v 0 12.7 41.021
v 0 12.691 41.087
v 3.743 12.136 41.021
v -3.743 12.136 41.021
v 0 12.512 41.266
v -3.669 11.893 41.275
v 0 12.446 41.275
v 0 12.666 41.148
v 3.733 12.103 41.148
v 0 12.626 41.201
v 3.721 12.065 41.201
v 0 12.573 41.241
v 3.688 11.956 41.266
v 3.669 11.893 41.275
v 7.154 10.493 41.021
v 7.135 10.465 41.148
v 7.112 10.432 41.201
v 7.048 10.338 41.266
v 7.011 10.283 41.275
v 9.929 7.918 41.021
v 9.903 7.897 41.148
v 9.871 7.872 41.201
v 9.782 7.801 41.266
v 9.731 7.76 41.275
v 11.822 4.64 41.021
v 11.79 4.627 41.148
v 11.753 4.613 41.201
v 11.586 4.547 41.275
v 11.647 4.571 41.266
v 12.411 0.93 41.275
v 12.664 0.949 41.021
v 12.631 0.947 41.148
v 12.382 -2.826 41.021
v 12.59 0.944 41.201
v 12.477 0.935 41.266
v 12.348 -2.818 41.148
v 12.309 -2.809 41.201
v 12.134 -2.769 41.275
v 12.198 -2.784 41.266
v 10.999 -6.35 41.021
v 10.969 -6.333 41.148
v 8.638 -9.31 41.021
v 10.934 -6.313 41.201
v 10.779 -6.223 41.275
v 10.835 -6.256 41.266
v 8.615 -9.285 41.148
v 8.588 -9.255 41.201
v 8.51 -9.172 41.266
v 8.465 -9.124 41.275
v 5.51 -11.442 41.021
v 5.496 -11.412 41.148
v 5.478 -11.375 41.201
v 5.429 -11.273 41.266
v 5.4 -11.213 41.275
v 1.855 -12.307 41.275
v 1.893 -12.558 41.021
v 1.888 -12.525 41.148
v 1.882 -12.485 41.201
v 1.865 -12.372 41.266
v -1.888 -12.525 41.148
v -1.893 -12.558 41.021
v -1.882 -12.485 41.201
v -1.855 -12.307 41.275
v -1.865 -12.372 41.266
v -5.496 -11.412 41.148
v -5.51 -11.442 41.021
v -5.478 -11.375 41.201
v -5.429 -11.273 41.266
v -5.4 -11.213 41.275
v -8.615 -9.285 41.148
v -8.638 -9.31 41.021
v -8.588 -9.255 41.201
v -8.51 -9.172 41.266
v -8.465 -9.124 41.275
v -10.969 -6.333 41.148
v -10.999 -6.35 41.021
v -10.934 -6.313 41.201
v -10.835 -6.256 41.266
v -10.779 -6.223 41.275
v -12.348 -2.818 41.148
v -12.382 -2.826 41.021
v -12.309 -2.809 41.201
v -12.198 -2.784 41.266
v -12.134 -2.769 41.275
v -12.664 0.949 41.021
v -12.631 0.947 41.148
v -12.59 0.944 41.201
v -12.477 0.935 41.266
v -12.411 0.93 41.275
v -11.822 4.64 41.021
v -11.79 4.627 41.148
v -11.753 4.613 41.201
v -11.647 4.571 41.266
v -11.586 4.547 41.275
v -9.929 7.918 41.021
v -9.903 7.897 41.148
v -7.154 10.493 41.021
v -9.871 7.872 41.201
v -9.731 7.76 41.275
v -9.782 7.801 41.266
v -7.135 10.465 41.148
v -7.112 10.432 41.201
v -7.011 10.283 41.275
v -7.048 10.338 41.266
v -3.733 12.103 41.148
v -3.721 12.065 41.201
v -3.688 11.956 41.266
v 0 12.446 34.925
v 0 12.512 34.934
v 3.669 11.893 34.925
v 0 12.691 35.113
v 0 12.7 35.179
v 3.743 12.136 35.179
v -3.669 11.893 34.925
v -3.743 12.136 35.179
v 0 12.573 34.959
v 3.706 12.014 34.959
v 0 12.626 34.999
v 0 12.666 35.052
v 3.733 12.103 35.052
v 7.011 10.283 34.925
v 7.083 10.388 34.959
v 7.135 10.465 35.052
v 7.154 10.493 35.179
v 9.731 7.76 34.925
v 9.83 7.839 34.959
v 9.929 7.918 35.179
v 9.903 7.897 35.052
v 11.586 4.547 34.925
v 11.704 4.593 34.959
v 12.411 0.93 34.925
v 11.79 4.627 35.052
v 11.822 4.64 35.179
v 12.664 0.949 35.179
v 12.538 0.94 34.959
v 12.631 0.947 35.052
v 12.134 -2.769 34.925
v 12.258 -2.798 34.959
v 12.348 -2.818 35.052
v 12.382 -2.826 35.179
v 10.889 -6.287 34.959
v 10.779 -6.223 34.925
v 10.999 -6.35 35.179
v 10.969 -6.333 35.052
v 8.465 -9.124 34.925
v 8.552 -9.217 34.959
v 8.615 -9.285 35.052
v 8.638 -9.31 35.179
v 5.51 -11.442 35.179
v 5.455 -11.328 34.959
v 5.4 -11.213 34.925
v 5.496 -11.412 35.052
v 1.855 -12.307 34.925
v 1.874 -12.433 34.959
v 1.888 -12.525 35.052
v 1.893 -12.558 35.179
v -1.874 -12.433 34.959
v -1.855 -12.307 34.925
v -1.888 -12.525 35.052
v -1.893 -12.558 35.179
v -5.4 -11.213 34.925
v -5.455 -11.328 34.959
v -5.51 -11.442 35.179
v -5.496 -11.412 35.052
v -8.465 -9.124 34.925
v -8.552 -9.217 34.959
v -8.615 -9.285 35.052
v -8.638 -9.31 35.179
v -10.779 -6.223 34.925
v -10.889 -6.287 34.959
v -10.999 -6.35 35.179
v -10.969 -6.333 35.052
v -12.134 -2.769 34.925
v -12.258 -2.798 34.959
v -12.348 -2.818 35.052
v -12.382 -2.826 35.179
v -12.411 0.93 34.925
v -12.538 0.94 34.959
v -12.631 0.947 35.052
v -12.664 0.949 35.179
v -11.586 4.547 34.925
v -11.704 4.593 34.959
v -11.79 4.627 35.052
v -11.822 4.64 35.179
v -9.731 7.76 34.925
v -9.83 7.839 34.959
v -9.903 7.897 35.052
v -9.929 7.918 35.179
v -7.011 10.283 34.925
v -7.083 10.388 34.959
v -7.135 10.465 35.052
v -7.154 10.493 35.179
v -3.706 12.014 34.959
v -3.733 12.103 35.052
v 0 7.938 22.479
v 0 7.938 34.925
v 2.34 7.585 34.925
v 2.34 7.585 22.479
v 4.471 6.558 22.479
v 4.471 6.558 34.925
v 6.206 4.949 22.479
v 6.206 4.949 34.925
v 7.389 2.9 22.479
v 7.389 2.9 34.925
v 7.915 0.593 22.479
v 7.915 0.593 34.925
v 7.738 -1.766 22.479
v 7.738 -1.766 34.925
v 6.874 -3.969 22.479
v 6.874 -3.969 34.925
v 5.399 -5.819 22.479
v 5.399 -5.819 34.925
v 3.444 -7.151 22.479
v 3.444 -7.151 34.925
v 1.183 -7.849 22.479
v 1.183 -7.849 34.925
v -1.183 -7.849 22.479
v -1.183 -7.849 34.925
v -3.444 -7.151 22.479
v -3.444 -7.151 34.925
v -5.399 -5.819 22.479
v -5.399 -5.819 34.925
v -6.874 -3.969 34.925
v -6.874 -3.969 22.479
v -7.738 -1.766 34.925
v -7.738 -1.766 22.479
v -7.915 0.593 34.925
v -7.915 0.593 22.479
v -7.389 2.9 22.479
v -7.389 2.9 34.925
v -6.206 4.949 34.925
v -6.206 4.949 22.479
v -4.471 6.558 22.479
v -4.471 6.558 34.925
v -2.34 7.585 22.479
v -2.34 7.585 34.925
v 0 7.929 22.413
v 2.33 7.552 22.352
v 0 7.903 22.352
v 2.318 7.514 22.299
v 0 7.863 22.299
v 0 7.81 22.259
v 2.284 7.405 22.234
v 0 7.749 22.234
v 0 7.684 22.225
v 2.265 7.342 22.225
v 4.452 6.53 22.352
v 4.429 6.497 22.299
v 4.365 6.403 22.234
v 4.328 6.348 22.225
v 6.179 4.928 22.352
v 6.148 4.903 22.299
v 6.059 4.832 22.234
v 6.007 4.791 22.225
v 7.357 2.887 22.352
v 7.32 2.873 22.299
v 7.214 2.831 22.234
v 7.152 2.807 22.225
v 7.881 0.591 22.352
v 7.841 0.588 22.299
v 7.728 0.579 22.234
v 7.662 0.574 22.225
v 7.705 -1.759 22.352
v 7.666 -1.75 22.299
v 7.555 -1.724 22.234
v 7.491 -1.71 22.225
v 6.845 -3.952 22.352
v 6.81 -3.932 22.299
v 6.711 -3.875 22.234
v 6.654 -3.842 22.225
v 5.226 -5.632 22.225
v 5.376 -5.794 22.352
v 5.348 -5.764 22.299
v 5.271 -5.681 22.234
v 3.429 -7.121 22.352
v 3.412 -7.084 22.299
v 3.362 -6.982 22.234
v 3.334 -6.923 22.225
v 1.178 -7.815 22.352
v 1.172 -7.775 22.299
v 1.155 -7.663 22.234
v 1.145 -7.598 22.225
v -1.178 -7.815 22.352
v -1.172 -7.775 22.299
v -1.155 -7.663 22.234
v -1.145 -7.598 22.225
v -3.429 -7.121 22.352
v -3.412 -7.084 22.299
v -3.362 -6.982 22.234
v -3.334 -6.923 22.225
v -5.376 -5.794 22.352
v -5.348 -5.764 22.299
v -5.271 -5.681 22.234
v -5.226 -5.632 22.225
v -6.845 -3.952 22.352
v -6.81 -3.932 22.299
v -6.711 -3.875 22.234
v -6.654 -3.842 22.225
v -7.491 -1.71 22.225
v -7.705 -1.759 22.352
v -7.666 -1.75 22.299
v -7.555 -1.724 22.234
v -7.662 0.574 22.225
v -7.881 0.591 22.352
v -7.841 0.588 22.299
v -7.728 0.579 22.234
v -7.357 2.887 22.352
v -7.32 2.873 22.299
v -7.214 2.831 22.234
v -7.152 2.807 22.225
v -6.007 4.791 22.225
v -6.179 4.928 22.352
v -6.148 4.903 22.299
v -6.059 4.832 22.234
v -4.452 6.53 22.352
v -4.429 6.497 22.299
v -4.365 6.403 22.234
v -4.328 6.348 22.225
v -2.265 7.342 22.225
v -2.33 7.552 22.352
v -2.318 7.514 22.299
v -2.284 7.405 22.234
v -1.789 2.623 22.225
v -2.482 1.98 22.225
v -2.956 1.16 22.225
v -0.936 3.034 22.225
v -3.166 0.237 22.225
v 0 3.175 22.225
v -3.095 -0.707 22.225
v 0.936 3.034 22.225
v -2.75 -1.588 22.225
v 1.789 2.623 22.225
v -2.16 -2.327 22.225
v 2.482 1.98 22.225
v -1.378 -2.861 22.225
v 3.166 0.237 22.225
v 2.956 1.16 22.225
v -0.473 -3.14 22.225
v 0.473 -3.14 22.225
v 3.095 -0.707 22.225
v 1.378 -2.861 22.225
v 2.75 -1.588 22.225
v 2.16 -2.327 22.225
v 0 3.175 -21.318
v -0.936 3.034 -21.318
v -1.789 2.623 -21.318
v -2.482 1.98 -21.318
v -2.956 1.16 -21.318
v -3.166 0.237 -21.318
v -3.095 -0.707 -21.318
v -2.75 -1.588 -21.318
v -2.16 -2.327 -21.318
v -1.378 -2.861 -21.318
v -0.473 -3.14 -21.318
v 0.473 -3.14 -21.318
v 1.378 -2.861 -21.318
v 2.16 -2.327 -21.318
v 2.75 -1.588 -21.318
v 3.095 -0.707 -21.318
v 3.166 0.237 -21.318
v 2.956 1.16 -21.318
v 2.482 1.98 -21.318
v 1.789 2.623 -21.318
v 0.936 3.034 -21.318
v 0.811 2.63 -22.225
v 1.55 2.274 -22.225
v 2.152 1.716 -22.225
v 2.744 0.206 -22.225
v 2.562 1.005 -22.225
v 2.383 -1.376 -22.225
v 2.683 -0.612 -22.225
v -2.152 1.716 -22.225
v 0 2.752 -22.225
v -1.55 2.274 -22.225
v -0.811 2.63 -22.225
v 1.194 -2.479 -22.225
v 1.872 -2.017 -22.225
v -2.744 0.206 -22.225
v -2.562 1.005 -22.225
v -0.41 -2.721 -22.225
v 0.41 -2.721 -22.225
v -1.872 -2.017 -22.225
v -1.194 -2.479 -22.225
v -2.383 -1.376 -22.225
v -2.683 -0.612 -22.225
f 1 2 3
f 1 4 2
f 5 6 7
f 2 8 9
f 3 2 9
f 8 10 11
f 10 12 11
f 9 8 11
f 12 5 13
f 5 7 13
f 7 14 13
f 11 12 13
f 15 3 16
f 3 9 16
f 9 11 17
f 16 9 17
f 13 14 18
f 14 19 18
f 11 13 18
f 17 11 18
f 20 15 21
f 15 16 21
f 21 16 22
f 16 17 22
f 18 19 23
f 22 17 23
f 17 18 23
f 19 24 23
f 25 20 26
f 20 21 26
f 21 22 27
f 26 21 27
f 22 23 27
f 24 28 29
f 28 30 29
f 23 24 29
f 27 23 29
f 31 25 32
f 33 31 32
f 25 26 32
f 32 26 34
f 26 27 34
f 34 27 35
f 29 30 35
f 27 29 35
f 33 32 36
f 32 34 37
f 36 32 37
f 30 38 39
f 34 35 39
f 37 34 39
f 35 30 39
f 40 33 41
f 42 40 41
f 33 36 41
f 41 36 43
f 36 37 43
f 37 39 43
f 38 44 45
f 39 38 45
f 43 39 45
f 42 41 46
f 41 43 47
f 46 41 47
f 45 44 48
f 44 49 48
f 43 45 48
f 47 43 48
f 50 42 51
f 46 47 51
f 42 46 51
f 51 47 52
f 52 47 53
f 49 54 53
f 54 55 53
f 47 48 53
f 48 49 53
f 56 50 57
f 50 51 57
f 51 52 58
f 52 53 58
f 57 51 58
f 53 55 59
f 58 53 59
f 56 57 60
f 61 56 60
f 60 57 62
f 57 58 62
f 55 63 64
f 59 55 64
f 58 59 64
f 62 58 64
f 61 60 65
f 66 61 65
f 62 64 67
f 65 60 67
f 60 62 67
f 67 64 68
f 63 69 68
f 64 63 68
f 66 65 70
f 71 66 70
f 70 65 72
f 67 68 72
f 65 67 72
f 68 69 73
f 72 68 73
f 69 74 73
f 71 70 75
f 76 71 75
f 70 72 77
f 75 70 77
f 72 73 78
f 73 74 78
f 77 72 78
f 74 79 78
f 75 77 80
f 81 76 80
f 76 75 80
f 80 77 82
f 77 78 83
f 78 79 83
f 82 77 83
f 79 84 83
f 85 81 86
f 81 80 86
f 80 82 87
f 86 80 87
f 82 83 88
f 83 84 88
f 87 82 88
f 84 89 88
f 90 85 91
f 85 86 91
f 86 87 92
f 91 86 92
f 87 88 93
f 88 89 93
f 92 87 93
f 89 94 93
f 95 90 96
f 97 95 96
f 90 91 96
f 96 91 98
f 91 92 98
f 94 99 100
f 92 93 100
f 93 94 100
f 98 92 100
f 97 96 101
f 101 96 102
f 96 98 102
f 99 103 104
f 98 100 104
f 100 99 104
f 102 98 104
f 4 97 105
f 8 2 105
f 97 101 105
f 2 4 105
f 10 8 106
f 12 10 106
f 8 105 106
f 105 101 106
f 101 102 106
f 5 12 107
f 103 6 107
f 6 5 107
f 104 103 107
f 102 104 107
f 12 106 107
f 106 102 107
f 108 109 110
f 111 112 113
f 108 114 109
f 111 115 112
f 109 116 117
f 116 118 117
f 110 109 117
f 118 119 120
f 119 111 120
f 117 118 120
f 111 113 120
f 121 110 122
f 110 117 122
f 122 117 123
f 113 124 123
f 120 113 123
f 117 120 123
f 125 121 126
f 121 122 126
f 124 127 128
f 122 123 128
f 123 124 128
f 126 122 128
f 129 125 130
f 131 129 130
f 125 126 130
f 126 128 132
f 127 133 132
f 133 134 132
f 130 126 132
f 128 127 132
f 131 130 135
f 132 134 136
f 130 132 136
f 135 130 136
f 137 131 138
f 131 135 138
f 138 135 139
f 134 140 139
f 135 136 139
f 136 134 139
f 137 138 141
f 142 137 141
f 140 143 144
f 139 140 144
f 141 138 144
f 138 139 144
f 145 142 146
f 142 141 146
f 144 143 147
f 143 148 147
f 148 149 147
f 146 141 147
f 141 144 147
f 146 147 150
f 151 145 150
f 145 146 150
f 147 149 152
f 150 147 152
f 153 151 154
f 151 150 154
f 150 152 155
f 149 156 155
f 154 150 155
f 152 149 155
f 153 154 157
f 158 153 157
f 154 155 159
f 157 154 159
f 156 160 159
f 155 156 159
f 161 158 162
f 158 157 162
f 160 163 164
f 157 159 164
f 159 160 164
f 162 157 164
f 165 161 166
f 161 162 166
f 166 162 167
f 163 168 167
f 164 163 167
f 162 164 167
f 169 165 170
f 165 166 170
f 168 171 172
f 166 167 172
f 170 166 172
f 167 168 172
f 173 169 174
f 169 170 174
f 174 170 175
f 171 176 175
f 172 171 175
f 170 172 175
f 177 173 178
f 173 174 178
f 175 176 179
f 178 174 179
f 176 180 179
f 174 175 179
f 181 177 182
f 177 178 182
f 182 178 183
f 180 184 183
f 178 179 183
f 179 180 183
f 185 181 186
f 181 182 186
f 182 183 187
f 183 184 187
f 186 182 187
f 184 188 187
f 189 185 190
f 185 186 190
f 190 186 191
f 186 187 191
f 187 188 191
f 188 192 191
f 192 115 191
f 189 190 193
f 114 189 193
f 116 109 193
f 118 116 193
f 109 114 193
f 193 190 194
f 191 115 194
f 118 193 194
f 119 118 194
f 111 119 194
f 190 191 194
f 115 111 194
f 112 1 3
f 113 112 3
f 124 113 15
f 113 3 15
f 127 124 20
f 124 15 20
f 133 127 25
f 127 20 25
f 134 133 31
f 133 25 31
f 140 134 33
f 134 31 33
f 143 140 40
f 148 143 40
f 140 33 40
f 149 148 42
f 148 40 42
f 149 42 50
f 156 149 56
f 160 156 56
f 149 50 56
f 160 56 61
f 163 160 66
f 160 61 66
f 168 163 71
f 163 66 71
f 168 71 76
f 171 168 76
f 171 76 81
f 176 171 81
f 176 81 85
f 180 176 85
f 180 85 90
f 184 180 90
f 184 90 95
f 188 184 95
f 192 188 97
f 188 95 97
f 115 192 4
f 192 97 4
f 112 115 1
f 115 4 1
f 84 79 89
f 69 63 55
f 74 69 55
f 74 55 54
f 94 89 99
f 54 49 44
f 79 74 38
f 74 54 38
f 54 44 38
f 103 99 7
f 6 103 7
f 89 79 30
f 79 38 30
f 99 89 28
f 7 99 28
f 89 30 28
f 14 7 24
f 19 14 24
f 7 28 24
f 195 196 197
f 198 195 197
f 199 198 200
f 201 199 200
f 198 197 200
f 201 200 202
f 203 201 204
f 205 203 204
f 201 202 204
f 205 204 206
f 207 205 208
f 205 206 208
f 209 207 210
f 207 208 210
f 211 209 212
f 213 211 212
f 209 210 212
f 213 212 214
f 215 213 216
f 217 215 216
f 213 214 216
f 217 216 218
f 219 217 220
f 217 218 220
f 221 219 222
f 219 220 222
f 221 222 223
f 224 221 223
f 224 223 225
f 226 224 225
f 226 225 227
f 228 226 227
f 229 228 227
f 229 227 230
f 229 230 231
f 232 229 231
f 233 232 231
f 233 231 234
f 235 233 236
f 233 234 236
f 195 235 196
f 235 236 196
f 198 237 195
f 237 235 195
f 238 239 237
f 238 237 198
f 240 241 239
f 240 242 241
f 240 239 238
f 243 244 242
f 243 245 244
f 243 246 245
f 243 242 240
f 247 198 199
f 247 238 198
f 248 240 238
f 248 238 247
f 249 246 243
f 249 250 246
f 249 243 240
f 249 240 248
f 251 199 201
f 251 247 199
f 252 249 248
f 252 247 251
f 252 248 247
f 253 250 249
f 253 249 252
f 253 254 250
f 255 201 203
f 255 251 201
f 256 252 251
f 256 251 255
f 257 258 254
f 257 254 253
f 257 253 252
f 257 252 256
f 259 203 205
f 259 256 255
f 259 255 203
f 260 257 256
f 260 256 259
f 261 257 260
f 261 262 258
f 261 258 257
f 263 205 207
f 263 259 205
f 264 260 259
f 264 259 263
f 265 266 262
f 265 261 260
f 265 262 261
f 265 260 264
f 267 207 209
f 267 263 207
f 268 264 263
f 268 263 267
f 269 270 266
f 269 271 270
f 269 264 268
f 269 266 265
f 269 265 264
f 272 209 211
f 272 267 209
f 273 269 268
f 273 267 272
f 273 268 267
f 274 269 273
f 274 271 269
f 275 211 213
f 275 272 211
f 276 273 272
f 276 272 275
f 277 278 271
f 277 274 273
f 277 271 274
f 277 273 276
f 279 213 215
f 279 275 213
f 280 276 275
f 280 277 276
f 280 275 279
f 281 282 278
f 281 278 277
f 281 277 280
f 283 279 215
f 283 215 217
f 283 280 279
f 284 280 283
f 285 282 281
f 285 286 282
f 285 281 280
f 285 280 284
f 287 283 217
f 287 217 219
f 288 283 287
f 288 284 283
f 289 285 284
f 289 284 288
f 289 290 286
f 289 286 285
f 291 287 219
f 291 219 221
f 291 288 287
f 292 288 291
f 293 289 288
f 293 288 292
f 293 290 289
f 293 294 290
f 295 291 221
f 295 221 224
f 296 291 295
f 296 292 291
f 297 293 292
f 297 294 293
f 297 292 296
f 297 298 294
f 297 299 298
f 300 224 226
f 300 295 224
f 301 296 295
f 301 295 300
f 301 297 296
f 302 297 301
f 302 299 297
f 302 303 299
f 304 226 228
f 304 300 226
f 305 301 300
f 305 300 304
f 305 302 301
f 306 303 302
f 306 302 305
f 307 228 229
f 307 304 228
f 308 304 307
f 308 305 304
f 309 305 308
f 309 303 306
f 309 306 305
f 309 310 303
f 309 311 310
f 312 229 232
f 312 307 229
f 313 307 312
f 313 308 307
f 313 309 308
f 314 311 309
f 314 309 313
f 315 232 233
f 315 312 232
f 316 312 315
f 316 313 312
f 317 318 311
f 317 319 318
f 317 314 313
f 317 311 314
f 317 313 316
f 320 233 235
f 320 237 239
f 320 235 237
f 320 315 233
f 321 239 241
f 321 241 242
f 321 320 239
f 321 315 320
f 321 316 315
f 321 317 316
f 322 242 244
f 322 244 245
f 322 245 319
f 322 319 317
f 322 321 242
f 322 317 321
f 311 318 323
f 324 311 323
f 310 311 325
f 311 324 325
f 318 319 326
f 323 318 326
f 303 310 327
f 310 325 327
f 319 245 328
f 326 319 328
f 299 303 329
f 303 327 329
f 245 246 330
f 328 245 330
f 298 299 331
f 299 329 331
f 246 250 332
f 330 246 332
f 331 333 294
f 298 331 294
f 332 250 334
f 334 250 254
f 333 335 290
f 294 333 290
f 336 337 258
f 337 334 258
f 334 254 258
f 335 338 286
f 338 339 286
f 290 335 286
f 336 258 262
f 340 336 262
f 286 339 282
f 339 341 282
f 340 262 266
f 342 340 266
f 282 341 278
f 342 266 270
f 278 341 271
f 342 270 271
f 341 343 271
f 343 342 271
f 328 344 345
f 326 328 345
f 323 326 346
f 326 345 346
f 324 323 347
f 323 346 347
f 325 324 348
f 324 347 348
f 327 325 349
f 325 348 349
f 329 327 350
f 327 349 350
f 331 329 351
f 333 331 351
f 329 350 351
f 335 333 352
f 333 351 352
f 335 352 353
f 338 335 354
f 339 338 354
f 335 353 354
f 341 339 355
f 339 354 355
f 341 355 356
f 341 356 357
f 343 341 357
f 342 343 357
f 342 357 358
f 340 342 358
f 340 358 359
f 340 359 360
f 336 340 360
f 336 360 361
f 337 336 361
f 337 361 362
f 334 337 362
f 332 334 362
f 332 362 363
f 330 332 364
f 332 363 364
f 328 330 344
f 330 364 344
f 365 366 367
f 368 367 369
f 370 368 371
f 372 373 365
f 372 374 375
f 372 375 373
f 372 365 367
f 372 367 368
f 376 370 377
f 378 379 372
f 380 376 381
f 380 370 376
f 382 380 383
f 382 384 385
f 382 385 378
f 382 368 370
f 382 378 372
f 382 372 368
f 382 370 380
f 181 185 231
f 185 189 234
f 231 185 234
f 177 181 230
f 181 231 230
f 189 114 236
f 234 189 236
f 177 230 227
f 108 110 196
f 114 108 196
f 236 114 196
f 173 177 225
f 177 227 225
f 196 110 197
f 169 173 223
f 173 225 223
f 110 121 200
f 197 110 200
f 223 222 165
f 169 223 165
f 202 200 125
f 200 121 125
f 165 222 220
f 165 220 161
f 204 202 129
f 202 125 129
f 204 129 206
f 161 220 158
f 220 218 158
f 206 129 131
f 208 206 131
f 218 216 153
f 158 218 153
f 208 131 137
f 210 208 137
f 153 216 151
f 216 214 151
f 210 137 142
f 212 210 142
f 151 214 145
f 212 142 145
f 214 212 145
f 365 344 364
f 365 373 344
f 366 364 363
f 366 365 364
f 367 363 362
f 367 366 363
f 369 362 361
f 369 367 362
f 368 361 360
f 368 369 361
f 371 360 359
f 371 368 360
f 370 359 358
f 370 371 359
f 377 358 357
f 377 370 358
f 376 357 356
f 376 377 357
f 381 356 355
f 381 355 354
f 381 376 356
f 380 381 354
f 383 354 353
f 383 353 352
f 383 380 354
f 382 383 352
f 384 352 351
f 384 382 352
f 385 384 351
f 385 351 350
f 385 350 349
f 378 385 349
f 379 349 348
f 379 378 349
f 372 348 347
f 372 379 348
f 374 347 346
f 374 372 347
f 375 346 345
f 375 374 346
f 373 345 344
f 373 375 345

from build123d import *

# Parameters (mm, degrees)
SKETCH1_W = 44.45
SKETCH1_H = 3.175
FILLET1_R = 0.254


with BuildPart() as part:
    # Sketch1 → Revolve1 (revolve)
    with BuildSketch(Plane(origin=(0, 0, 0), x_dir=(0, 0, -1), z_dir=(1, 0, 0))):
        with Locations((0, 1.5875)):
            Rectangle(SKETCH1_W, SKETCH1_H)
    revolve(axis=Axis((0, 0, 8.5598), (0, 0, 1)))

    # Sketch5 → Revolve3 (revolve)
    with BuildSketch(Plane(origin=(0, 0, 0), x_dir=(0, 0, -1), z_dir=(1, 0, 0))):
        Polygon((-22.225, 7.9375), (-34.925, 7.9375), (-34.925, 12.7), (-41.275, 12.7), (-41.275, 0), (-22.225, 0), align=None)
    revolve(axis=Axis((0, 0, 22.225), (0, 0, -1)))

    # Sketch11 → Cut-Revolve4 (revolve, cut)
    with BuildSketch(Plane(origin=(0, 0, 0), x_dir=(0, 0, -1), z_dir=(1, 0, 0))):
        Polygon((21.317857143, 3.175), (22.225, 2.751992339), (22.225, 3.175), align=None)
    revolve(axis=Axis((0, 0, 0), (0, 0, -1)), mode=Mode.SUBTRACT)

    # Fillet1
    fillet1_edges = [part.edges().sort_by_distance(p)[0] for p in [
        (0, -7.9375, 22.225),
        (0, -12.7, 34.925),
        (0, -12.7, 41.275),
    ]]
    fillet(fillet1_edges, radius=FILLET1_R)


solid = part.part
